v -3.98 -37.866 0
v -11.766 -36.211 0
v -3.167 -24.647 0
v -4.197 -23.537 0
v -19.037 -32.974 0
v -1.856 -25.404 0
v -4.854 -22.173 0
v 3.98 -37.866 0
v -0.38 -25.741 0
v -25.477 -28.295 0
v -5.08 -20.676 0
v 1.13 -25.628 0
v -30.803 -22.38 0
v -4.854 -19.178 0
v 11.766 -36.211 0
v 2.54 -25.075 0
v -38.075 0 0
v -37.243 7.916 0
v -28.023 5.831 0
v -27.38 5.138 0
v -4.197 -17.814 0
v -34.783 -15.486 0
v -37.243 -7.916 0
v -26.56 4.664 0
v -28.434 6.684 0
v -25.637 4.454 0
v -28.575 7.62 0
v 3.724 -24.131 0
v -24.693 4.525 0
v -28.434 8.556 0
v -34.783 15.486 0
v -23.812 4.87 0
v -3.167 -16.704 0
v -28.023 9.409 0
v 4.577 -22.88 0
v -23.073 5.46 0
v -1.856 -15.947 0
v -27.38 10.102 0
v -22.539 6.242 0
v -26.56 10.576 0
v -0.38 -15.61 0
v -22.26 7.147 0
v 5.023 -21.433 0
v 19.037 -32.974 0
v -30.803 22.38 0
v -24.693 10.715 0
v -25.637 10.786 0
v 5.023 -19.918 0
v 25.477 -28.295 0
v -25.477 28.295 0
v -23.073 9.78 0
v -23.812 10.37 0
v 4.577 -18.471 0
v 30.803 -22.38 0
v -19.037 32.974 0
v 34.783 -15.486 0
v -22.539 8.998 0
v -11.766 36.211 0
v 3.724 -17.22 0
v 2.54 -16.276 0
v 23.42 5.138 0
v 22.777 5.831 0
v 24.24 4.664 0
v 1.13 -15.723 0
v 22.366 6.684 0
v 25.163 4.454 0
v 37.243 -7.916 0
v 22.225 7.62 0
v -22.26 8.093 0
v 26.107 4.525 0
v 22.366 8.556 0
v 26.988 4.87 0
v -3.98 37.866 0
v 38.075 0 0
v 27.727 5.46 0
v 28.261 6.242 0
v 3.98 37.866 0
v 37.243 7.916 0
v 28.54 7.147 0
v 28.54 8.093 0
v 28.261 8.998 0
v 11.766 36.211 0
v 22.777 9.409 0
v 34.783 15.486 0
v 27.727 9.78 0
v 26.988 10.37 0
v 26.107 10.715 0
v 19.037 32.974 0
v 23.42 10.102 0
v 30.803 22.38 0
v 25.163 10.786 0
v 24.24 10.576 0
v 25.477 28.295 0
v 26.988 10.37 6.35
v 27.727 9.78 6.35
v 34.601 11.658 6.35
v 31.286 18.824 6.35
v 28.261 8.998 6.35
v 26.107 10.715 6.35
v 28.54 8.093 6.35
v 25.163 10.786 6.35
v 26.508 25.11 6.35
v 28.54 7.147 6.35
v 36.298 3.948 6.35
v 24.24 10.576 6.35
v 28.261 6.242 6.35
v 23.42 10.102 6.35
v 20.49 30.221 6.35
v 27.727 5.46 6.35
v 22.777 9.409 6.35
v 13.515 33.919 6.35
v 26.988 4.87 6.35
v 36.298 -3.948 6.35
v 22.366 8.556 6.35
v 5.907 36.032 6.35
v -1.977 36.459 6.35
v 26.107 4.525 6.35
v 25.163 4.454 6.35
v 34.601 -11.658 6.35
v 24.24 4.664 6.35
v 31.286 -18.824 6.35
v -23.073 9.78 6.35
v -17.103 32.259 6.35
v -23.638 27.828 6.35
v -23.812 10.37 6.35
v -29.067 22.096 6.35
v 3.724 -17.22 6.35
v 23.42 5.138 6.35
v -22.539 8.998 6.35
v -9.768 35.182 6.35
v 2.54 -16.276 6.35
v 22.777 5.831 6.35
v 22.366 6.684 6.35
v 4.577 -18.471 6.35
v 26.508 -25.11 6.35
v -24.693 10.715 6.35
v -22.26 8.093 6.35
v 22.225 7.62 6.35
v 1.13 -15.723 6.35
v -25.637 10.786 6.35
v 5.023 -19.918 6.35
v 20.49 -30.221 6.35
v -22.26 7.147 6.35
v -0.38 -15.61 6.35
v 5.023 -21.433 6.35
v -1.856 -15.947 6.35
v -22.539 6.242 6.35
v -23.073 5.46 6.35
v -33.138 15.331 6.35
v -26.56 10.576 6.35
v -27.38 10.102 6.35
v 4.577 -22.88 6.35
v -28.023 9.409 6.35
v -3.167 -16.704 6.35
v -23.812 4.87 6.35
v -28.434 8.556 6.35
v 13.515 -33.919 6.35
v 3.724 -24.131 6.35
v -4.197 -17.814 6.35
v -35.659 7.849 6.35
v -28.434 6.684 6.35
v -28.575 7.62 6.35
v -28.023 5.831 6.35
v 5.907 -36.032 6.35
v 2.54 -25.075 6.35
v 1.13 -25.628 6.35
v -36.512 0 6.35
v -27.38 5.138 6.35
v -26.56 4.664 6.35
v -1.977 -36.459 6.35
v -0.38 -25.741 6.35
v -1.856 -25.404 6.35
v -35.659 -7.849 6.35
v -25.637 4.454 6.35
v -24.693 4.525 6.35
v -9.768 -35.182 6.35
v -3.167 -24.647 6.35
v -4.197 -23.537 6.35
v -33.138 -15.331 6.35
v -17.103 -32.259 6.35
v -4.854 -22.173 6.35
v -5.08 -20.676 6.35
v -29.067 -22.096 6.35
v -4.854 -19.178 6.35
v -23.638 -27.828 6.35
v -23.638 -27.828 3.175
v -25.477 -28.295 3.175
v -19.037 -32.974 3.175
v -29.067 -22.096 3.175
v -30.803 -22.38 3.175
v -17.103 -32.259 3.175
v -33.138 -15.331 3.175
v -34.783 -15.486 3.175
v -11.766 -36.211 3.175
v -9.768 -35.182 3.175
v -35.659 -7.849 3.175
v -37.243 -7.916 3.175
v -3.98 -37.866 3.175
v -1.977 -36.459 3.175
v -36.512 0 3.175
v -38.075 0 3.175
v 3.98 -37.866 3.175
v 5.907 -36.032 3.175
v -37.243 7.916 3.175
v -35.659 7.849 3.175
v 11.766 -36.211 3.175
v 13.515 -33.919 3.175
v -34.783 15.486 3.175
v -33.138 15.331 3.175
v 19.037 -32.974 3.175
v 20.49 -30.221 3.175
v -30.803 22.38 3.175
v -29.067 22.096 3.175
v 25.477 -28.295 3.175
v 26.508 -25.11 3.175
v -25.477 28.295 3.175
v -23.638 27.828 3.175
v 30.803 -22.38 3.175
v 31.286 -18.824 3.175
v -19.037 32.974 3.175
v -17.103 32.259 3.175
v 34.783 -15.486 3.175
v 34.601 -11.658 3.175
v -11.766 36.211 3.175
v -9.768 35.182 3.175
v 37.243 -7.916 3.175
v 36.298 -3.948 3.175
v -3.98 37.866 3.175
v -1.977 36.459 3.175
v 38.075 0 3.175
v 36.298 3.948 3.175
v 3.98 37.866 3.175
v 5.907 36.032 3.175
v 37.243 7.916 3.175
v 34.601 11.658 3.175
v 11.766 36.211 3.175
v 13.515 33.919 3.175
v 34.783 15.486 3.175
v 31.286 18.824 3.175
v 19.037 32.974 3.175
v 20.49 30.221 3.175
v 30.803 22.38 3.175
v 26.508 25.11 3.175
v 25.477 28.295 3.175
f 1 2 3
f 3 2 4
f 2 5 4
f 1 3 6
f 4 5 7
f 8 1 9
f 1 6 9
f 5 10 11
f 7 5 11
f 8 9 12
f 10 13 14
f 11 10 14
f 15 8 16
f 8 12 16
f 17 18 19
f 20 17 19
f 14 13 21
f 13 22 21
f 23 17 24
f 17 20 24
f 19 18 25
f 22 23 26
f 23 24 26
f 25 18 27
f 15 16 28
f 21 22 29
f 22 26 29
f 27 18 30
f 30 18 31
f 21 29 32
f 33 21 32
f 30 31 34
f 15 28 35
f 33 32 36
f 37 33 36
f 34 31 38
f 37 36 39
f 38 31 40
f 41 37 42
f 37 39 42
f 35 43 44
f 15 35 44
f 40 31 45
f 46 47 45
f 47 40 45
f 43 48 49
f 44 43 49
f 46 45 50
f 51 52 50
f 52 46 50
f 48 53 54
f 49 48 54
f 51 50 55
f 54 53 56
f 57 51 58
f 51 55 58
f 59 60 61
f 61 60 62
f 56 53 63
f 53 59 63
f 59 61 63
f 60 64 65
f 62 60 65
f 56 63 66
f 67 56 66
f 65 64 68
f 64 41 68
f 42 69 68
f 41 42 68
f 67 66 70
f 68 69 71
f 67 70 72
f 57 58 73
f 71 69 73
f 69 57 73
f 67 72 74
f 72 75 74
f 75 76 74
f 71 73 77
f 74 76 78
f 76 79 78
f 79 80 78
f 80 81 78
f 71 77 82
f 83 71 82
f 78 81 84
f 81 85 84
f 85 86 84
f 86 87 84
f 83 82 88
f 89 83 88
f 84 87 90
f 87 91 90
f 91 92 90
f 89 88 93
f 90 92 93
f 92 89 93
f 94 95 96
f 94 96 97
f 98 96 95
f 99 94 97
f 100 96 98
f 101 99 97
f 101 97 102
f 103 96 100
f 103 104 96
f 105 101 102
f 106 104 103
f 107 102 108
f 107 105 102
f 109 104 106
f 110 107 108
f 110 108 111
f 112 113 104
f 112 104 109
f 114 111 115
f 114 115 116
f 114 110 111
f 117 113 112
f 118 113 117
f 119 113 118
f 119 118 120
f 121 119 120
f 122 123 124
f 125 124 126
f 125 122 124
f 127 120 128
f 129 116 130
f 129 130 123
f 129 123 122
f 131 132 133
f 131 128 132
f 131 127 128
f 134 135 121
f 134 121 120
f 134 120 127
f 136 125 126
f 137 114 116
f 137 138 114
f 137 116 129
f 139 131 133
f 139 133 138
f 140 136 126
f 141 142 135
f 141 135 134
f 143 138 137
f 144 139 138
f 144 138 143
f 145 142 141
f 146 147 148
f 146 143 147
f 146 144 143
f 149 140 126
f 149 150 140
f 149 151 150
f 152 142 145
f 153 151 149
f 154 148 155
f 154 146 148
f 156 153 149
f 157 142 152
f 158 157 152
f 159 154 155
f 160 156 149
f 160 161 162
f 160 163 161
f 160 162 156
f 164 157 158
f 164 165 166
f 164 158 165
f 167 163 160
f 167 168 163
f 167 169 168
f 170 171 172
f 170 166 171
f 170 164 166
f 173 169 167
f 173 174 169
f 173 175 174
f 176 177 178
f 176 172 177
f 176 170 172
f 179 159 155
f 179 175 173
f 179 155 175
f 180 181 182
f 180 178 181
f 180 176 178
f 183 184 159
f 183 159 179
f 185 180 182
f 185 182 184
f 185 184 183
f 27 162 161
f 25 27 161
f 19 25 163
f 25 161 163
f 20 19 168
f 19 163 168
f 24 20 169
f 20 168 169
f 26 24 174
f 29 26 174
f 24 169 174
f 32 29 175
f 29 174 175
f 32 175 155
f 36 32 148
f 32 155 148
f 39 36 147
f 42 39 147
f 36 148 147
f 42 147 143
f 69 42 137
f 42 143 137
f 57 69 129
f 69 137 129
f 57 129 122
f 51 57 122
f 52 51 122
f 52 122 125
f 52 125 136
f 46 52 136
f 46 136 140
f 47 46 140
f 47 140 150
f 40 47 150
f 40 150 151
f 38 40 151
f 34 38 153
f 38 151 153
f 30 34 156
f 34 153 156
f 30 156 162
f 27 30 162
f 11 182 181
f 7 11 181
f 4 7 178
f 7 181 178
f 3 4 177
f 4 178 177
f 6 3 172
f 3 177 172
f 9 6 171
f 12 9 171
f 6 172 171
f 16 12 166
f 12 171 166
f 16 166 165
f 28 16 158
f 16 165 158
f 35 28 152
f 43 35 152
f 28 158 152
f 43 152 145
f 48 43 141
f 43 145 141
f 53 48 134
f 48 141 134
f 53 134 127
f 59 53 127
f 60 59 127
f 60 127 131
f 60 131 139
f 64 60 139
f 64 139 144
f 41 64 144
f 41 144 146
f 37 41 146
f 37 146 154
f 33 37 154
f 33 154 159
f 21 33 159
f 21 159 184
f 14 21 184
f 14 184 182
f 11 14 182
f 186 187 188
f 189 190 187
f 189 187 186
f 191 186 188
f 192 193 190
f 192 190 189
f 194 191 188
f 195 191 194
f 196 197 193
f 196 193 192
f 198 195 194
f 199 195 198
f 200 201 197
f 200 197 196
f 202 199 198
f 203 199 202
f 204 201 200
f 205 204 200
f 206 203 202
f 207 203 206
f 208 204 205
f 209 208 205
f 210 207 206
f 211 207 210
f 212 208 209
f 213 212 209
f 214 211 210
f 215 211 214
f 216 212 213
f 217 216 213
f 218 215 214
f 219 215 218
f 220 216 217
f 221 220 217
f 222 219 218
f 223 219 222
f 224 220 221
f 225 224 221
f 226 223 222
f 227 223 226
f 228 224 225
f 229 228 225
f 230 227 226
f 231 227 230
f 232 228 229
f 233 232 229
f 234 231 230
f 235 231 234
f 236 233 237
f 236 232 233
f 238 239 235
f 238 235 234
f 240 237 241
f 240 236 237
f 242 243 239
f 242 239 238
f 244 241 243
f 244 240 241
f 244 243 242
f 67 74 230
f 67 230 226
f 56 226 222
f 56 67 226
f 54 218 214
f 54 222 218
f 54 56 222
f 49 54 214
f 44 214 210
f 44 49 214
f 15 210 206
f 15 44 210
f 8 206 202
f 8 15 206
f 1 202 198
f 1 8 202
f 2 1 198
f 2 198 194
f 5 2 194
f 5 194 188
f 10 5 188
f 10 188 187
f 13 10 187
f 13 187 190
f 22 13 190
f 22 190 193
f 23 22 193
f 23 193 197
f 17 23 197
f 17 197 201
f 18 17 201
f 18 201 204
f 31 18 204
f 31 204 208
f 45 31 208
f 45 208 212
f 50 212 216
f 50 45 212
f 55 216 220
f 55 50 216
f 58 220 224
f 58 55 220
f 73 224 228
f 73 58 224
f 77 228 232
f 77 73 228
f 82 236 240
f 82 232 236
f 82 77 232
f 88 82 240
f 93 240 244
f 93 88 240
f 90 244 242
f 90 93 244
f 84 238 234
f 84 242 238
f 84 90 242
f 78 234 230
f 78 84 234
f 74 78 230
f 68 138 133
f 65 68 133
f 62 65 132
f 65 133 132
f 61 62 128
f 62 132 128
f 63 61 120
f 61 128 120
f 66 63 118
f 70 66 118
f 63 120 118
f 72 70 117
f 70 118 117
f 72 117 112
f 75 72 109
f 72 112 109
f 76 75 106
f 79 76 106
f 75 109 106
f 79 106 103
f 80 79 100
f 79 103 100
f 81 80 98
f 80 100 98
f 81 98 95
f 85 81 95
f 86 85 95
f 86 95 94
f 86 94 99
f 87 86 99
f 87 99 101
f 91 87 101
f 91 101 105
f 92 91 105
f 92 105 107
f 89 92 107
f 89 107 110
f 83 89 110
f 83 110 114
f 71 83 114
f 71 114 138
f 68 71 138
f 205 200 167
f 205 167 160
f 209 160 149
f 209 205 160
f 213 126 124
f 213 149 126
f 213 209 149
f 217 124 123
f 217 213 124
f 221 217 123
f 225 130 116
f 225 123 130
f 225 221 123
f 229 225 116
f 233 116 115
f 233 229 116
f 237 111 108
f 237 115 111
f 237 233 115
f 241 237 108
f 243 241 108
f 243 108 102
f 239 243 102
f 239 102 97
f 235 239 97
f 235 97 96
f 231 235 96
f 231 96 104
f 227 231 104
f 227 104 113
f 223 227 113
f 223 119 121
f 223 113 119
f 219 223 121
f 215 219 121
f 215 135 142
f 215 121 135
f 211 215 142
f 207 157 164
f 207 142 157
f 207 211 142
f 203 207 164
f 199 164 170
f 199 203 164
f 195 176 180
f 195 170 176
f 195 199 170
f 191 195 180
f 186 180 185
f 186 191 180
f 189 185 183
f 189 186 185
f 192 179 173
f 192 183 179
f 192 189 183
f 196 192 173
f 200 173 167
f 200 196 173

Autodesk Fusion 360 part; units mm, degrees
sketch "Sketch1" plane through (0, 0, 0) normal (0, 0, 1) x (1, 0, 0)
  circle A0 centre (0, 0) radius 38.0746
  dimension "d1" = 76.1492
extrude "Extrude1" add sketch "Sketch1" along normal blind 3.175
sketch "Sketch2" plane through (0, 0, 3.175) normal (0, 0, 1) x (-1, 0, 0)
  circle A0 centre (0, 0) radius 38.0746
  circle A1 centre (0, 0) radius 36.5125
  dimension "d4" = 73.025
extrude "Extrude2" add sketch "Sketch2" along normal blind 3.175 contours A1
sketch "Sketch3" plane through (0, 0, 6.35) normal (0, 0, 1) x (-1, 0, 0)
  circle A0 centre (0, 0) radius 36.5125
  circle A1 centre (25.4, -7.62) radius 3.175
  circle A2 centre (-25.4, -7.62) radius 3.175
  circle A3 centre (0, 20.6756) radius 5.08
  circle A4 centre (0, 0) radius 38.0746
  dimension "d7" = 50.8
  dimension "d8" = 25.4
  dimension "d9" = 7.62
  dimension "d10" = 6.35
  dimension "d11" = 6.35
  dimension "d12" = 10.16
  dimension "d13" = 20.6756
extrude "Extrude3" cut sketch "Sketch3" against normal blind 6.35 contours A1 | A2 | A3
equation "d2 = ( 0.25 / 2 ) * 1 in"
equation "d5 = ( 0.25 / 2 ) * 1 in"
